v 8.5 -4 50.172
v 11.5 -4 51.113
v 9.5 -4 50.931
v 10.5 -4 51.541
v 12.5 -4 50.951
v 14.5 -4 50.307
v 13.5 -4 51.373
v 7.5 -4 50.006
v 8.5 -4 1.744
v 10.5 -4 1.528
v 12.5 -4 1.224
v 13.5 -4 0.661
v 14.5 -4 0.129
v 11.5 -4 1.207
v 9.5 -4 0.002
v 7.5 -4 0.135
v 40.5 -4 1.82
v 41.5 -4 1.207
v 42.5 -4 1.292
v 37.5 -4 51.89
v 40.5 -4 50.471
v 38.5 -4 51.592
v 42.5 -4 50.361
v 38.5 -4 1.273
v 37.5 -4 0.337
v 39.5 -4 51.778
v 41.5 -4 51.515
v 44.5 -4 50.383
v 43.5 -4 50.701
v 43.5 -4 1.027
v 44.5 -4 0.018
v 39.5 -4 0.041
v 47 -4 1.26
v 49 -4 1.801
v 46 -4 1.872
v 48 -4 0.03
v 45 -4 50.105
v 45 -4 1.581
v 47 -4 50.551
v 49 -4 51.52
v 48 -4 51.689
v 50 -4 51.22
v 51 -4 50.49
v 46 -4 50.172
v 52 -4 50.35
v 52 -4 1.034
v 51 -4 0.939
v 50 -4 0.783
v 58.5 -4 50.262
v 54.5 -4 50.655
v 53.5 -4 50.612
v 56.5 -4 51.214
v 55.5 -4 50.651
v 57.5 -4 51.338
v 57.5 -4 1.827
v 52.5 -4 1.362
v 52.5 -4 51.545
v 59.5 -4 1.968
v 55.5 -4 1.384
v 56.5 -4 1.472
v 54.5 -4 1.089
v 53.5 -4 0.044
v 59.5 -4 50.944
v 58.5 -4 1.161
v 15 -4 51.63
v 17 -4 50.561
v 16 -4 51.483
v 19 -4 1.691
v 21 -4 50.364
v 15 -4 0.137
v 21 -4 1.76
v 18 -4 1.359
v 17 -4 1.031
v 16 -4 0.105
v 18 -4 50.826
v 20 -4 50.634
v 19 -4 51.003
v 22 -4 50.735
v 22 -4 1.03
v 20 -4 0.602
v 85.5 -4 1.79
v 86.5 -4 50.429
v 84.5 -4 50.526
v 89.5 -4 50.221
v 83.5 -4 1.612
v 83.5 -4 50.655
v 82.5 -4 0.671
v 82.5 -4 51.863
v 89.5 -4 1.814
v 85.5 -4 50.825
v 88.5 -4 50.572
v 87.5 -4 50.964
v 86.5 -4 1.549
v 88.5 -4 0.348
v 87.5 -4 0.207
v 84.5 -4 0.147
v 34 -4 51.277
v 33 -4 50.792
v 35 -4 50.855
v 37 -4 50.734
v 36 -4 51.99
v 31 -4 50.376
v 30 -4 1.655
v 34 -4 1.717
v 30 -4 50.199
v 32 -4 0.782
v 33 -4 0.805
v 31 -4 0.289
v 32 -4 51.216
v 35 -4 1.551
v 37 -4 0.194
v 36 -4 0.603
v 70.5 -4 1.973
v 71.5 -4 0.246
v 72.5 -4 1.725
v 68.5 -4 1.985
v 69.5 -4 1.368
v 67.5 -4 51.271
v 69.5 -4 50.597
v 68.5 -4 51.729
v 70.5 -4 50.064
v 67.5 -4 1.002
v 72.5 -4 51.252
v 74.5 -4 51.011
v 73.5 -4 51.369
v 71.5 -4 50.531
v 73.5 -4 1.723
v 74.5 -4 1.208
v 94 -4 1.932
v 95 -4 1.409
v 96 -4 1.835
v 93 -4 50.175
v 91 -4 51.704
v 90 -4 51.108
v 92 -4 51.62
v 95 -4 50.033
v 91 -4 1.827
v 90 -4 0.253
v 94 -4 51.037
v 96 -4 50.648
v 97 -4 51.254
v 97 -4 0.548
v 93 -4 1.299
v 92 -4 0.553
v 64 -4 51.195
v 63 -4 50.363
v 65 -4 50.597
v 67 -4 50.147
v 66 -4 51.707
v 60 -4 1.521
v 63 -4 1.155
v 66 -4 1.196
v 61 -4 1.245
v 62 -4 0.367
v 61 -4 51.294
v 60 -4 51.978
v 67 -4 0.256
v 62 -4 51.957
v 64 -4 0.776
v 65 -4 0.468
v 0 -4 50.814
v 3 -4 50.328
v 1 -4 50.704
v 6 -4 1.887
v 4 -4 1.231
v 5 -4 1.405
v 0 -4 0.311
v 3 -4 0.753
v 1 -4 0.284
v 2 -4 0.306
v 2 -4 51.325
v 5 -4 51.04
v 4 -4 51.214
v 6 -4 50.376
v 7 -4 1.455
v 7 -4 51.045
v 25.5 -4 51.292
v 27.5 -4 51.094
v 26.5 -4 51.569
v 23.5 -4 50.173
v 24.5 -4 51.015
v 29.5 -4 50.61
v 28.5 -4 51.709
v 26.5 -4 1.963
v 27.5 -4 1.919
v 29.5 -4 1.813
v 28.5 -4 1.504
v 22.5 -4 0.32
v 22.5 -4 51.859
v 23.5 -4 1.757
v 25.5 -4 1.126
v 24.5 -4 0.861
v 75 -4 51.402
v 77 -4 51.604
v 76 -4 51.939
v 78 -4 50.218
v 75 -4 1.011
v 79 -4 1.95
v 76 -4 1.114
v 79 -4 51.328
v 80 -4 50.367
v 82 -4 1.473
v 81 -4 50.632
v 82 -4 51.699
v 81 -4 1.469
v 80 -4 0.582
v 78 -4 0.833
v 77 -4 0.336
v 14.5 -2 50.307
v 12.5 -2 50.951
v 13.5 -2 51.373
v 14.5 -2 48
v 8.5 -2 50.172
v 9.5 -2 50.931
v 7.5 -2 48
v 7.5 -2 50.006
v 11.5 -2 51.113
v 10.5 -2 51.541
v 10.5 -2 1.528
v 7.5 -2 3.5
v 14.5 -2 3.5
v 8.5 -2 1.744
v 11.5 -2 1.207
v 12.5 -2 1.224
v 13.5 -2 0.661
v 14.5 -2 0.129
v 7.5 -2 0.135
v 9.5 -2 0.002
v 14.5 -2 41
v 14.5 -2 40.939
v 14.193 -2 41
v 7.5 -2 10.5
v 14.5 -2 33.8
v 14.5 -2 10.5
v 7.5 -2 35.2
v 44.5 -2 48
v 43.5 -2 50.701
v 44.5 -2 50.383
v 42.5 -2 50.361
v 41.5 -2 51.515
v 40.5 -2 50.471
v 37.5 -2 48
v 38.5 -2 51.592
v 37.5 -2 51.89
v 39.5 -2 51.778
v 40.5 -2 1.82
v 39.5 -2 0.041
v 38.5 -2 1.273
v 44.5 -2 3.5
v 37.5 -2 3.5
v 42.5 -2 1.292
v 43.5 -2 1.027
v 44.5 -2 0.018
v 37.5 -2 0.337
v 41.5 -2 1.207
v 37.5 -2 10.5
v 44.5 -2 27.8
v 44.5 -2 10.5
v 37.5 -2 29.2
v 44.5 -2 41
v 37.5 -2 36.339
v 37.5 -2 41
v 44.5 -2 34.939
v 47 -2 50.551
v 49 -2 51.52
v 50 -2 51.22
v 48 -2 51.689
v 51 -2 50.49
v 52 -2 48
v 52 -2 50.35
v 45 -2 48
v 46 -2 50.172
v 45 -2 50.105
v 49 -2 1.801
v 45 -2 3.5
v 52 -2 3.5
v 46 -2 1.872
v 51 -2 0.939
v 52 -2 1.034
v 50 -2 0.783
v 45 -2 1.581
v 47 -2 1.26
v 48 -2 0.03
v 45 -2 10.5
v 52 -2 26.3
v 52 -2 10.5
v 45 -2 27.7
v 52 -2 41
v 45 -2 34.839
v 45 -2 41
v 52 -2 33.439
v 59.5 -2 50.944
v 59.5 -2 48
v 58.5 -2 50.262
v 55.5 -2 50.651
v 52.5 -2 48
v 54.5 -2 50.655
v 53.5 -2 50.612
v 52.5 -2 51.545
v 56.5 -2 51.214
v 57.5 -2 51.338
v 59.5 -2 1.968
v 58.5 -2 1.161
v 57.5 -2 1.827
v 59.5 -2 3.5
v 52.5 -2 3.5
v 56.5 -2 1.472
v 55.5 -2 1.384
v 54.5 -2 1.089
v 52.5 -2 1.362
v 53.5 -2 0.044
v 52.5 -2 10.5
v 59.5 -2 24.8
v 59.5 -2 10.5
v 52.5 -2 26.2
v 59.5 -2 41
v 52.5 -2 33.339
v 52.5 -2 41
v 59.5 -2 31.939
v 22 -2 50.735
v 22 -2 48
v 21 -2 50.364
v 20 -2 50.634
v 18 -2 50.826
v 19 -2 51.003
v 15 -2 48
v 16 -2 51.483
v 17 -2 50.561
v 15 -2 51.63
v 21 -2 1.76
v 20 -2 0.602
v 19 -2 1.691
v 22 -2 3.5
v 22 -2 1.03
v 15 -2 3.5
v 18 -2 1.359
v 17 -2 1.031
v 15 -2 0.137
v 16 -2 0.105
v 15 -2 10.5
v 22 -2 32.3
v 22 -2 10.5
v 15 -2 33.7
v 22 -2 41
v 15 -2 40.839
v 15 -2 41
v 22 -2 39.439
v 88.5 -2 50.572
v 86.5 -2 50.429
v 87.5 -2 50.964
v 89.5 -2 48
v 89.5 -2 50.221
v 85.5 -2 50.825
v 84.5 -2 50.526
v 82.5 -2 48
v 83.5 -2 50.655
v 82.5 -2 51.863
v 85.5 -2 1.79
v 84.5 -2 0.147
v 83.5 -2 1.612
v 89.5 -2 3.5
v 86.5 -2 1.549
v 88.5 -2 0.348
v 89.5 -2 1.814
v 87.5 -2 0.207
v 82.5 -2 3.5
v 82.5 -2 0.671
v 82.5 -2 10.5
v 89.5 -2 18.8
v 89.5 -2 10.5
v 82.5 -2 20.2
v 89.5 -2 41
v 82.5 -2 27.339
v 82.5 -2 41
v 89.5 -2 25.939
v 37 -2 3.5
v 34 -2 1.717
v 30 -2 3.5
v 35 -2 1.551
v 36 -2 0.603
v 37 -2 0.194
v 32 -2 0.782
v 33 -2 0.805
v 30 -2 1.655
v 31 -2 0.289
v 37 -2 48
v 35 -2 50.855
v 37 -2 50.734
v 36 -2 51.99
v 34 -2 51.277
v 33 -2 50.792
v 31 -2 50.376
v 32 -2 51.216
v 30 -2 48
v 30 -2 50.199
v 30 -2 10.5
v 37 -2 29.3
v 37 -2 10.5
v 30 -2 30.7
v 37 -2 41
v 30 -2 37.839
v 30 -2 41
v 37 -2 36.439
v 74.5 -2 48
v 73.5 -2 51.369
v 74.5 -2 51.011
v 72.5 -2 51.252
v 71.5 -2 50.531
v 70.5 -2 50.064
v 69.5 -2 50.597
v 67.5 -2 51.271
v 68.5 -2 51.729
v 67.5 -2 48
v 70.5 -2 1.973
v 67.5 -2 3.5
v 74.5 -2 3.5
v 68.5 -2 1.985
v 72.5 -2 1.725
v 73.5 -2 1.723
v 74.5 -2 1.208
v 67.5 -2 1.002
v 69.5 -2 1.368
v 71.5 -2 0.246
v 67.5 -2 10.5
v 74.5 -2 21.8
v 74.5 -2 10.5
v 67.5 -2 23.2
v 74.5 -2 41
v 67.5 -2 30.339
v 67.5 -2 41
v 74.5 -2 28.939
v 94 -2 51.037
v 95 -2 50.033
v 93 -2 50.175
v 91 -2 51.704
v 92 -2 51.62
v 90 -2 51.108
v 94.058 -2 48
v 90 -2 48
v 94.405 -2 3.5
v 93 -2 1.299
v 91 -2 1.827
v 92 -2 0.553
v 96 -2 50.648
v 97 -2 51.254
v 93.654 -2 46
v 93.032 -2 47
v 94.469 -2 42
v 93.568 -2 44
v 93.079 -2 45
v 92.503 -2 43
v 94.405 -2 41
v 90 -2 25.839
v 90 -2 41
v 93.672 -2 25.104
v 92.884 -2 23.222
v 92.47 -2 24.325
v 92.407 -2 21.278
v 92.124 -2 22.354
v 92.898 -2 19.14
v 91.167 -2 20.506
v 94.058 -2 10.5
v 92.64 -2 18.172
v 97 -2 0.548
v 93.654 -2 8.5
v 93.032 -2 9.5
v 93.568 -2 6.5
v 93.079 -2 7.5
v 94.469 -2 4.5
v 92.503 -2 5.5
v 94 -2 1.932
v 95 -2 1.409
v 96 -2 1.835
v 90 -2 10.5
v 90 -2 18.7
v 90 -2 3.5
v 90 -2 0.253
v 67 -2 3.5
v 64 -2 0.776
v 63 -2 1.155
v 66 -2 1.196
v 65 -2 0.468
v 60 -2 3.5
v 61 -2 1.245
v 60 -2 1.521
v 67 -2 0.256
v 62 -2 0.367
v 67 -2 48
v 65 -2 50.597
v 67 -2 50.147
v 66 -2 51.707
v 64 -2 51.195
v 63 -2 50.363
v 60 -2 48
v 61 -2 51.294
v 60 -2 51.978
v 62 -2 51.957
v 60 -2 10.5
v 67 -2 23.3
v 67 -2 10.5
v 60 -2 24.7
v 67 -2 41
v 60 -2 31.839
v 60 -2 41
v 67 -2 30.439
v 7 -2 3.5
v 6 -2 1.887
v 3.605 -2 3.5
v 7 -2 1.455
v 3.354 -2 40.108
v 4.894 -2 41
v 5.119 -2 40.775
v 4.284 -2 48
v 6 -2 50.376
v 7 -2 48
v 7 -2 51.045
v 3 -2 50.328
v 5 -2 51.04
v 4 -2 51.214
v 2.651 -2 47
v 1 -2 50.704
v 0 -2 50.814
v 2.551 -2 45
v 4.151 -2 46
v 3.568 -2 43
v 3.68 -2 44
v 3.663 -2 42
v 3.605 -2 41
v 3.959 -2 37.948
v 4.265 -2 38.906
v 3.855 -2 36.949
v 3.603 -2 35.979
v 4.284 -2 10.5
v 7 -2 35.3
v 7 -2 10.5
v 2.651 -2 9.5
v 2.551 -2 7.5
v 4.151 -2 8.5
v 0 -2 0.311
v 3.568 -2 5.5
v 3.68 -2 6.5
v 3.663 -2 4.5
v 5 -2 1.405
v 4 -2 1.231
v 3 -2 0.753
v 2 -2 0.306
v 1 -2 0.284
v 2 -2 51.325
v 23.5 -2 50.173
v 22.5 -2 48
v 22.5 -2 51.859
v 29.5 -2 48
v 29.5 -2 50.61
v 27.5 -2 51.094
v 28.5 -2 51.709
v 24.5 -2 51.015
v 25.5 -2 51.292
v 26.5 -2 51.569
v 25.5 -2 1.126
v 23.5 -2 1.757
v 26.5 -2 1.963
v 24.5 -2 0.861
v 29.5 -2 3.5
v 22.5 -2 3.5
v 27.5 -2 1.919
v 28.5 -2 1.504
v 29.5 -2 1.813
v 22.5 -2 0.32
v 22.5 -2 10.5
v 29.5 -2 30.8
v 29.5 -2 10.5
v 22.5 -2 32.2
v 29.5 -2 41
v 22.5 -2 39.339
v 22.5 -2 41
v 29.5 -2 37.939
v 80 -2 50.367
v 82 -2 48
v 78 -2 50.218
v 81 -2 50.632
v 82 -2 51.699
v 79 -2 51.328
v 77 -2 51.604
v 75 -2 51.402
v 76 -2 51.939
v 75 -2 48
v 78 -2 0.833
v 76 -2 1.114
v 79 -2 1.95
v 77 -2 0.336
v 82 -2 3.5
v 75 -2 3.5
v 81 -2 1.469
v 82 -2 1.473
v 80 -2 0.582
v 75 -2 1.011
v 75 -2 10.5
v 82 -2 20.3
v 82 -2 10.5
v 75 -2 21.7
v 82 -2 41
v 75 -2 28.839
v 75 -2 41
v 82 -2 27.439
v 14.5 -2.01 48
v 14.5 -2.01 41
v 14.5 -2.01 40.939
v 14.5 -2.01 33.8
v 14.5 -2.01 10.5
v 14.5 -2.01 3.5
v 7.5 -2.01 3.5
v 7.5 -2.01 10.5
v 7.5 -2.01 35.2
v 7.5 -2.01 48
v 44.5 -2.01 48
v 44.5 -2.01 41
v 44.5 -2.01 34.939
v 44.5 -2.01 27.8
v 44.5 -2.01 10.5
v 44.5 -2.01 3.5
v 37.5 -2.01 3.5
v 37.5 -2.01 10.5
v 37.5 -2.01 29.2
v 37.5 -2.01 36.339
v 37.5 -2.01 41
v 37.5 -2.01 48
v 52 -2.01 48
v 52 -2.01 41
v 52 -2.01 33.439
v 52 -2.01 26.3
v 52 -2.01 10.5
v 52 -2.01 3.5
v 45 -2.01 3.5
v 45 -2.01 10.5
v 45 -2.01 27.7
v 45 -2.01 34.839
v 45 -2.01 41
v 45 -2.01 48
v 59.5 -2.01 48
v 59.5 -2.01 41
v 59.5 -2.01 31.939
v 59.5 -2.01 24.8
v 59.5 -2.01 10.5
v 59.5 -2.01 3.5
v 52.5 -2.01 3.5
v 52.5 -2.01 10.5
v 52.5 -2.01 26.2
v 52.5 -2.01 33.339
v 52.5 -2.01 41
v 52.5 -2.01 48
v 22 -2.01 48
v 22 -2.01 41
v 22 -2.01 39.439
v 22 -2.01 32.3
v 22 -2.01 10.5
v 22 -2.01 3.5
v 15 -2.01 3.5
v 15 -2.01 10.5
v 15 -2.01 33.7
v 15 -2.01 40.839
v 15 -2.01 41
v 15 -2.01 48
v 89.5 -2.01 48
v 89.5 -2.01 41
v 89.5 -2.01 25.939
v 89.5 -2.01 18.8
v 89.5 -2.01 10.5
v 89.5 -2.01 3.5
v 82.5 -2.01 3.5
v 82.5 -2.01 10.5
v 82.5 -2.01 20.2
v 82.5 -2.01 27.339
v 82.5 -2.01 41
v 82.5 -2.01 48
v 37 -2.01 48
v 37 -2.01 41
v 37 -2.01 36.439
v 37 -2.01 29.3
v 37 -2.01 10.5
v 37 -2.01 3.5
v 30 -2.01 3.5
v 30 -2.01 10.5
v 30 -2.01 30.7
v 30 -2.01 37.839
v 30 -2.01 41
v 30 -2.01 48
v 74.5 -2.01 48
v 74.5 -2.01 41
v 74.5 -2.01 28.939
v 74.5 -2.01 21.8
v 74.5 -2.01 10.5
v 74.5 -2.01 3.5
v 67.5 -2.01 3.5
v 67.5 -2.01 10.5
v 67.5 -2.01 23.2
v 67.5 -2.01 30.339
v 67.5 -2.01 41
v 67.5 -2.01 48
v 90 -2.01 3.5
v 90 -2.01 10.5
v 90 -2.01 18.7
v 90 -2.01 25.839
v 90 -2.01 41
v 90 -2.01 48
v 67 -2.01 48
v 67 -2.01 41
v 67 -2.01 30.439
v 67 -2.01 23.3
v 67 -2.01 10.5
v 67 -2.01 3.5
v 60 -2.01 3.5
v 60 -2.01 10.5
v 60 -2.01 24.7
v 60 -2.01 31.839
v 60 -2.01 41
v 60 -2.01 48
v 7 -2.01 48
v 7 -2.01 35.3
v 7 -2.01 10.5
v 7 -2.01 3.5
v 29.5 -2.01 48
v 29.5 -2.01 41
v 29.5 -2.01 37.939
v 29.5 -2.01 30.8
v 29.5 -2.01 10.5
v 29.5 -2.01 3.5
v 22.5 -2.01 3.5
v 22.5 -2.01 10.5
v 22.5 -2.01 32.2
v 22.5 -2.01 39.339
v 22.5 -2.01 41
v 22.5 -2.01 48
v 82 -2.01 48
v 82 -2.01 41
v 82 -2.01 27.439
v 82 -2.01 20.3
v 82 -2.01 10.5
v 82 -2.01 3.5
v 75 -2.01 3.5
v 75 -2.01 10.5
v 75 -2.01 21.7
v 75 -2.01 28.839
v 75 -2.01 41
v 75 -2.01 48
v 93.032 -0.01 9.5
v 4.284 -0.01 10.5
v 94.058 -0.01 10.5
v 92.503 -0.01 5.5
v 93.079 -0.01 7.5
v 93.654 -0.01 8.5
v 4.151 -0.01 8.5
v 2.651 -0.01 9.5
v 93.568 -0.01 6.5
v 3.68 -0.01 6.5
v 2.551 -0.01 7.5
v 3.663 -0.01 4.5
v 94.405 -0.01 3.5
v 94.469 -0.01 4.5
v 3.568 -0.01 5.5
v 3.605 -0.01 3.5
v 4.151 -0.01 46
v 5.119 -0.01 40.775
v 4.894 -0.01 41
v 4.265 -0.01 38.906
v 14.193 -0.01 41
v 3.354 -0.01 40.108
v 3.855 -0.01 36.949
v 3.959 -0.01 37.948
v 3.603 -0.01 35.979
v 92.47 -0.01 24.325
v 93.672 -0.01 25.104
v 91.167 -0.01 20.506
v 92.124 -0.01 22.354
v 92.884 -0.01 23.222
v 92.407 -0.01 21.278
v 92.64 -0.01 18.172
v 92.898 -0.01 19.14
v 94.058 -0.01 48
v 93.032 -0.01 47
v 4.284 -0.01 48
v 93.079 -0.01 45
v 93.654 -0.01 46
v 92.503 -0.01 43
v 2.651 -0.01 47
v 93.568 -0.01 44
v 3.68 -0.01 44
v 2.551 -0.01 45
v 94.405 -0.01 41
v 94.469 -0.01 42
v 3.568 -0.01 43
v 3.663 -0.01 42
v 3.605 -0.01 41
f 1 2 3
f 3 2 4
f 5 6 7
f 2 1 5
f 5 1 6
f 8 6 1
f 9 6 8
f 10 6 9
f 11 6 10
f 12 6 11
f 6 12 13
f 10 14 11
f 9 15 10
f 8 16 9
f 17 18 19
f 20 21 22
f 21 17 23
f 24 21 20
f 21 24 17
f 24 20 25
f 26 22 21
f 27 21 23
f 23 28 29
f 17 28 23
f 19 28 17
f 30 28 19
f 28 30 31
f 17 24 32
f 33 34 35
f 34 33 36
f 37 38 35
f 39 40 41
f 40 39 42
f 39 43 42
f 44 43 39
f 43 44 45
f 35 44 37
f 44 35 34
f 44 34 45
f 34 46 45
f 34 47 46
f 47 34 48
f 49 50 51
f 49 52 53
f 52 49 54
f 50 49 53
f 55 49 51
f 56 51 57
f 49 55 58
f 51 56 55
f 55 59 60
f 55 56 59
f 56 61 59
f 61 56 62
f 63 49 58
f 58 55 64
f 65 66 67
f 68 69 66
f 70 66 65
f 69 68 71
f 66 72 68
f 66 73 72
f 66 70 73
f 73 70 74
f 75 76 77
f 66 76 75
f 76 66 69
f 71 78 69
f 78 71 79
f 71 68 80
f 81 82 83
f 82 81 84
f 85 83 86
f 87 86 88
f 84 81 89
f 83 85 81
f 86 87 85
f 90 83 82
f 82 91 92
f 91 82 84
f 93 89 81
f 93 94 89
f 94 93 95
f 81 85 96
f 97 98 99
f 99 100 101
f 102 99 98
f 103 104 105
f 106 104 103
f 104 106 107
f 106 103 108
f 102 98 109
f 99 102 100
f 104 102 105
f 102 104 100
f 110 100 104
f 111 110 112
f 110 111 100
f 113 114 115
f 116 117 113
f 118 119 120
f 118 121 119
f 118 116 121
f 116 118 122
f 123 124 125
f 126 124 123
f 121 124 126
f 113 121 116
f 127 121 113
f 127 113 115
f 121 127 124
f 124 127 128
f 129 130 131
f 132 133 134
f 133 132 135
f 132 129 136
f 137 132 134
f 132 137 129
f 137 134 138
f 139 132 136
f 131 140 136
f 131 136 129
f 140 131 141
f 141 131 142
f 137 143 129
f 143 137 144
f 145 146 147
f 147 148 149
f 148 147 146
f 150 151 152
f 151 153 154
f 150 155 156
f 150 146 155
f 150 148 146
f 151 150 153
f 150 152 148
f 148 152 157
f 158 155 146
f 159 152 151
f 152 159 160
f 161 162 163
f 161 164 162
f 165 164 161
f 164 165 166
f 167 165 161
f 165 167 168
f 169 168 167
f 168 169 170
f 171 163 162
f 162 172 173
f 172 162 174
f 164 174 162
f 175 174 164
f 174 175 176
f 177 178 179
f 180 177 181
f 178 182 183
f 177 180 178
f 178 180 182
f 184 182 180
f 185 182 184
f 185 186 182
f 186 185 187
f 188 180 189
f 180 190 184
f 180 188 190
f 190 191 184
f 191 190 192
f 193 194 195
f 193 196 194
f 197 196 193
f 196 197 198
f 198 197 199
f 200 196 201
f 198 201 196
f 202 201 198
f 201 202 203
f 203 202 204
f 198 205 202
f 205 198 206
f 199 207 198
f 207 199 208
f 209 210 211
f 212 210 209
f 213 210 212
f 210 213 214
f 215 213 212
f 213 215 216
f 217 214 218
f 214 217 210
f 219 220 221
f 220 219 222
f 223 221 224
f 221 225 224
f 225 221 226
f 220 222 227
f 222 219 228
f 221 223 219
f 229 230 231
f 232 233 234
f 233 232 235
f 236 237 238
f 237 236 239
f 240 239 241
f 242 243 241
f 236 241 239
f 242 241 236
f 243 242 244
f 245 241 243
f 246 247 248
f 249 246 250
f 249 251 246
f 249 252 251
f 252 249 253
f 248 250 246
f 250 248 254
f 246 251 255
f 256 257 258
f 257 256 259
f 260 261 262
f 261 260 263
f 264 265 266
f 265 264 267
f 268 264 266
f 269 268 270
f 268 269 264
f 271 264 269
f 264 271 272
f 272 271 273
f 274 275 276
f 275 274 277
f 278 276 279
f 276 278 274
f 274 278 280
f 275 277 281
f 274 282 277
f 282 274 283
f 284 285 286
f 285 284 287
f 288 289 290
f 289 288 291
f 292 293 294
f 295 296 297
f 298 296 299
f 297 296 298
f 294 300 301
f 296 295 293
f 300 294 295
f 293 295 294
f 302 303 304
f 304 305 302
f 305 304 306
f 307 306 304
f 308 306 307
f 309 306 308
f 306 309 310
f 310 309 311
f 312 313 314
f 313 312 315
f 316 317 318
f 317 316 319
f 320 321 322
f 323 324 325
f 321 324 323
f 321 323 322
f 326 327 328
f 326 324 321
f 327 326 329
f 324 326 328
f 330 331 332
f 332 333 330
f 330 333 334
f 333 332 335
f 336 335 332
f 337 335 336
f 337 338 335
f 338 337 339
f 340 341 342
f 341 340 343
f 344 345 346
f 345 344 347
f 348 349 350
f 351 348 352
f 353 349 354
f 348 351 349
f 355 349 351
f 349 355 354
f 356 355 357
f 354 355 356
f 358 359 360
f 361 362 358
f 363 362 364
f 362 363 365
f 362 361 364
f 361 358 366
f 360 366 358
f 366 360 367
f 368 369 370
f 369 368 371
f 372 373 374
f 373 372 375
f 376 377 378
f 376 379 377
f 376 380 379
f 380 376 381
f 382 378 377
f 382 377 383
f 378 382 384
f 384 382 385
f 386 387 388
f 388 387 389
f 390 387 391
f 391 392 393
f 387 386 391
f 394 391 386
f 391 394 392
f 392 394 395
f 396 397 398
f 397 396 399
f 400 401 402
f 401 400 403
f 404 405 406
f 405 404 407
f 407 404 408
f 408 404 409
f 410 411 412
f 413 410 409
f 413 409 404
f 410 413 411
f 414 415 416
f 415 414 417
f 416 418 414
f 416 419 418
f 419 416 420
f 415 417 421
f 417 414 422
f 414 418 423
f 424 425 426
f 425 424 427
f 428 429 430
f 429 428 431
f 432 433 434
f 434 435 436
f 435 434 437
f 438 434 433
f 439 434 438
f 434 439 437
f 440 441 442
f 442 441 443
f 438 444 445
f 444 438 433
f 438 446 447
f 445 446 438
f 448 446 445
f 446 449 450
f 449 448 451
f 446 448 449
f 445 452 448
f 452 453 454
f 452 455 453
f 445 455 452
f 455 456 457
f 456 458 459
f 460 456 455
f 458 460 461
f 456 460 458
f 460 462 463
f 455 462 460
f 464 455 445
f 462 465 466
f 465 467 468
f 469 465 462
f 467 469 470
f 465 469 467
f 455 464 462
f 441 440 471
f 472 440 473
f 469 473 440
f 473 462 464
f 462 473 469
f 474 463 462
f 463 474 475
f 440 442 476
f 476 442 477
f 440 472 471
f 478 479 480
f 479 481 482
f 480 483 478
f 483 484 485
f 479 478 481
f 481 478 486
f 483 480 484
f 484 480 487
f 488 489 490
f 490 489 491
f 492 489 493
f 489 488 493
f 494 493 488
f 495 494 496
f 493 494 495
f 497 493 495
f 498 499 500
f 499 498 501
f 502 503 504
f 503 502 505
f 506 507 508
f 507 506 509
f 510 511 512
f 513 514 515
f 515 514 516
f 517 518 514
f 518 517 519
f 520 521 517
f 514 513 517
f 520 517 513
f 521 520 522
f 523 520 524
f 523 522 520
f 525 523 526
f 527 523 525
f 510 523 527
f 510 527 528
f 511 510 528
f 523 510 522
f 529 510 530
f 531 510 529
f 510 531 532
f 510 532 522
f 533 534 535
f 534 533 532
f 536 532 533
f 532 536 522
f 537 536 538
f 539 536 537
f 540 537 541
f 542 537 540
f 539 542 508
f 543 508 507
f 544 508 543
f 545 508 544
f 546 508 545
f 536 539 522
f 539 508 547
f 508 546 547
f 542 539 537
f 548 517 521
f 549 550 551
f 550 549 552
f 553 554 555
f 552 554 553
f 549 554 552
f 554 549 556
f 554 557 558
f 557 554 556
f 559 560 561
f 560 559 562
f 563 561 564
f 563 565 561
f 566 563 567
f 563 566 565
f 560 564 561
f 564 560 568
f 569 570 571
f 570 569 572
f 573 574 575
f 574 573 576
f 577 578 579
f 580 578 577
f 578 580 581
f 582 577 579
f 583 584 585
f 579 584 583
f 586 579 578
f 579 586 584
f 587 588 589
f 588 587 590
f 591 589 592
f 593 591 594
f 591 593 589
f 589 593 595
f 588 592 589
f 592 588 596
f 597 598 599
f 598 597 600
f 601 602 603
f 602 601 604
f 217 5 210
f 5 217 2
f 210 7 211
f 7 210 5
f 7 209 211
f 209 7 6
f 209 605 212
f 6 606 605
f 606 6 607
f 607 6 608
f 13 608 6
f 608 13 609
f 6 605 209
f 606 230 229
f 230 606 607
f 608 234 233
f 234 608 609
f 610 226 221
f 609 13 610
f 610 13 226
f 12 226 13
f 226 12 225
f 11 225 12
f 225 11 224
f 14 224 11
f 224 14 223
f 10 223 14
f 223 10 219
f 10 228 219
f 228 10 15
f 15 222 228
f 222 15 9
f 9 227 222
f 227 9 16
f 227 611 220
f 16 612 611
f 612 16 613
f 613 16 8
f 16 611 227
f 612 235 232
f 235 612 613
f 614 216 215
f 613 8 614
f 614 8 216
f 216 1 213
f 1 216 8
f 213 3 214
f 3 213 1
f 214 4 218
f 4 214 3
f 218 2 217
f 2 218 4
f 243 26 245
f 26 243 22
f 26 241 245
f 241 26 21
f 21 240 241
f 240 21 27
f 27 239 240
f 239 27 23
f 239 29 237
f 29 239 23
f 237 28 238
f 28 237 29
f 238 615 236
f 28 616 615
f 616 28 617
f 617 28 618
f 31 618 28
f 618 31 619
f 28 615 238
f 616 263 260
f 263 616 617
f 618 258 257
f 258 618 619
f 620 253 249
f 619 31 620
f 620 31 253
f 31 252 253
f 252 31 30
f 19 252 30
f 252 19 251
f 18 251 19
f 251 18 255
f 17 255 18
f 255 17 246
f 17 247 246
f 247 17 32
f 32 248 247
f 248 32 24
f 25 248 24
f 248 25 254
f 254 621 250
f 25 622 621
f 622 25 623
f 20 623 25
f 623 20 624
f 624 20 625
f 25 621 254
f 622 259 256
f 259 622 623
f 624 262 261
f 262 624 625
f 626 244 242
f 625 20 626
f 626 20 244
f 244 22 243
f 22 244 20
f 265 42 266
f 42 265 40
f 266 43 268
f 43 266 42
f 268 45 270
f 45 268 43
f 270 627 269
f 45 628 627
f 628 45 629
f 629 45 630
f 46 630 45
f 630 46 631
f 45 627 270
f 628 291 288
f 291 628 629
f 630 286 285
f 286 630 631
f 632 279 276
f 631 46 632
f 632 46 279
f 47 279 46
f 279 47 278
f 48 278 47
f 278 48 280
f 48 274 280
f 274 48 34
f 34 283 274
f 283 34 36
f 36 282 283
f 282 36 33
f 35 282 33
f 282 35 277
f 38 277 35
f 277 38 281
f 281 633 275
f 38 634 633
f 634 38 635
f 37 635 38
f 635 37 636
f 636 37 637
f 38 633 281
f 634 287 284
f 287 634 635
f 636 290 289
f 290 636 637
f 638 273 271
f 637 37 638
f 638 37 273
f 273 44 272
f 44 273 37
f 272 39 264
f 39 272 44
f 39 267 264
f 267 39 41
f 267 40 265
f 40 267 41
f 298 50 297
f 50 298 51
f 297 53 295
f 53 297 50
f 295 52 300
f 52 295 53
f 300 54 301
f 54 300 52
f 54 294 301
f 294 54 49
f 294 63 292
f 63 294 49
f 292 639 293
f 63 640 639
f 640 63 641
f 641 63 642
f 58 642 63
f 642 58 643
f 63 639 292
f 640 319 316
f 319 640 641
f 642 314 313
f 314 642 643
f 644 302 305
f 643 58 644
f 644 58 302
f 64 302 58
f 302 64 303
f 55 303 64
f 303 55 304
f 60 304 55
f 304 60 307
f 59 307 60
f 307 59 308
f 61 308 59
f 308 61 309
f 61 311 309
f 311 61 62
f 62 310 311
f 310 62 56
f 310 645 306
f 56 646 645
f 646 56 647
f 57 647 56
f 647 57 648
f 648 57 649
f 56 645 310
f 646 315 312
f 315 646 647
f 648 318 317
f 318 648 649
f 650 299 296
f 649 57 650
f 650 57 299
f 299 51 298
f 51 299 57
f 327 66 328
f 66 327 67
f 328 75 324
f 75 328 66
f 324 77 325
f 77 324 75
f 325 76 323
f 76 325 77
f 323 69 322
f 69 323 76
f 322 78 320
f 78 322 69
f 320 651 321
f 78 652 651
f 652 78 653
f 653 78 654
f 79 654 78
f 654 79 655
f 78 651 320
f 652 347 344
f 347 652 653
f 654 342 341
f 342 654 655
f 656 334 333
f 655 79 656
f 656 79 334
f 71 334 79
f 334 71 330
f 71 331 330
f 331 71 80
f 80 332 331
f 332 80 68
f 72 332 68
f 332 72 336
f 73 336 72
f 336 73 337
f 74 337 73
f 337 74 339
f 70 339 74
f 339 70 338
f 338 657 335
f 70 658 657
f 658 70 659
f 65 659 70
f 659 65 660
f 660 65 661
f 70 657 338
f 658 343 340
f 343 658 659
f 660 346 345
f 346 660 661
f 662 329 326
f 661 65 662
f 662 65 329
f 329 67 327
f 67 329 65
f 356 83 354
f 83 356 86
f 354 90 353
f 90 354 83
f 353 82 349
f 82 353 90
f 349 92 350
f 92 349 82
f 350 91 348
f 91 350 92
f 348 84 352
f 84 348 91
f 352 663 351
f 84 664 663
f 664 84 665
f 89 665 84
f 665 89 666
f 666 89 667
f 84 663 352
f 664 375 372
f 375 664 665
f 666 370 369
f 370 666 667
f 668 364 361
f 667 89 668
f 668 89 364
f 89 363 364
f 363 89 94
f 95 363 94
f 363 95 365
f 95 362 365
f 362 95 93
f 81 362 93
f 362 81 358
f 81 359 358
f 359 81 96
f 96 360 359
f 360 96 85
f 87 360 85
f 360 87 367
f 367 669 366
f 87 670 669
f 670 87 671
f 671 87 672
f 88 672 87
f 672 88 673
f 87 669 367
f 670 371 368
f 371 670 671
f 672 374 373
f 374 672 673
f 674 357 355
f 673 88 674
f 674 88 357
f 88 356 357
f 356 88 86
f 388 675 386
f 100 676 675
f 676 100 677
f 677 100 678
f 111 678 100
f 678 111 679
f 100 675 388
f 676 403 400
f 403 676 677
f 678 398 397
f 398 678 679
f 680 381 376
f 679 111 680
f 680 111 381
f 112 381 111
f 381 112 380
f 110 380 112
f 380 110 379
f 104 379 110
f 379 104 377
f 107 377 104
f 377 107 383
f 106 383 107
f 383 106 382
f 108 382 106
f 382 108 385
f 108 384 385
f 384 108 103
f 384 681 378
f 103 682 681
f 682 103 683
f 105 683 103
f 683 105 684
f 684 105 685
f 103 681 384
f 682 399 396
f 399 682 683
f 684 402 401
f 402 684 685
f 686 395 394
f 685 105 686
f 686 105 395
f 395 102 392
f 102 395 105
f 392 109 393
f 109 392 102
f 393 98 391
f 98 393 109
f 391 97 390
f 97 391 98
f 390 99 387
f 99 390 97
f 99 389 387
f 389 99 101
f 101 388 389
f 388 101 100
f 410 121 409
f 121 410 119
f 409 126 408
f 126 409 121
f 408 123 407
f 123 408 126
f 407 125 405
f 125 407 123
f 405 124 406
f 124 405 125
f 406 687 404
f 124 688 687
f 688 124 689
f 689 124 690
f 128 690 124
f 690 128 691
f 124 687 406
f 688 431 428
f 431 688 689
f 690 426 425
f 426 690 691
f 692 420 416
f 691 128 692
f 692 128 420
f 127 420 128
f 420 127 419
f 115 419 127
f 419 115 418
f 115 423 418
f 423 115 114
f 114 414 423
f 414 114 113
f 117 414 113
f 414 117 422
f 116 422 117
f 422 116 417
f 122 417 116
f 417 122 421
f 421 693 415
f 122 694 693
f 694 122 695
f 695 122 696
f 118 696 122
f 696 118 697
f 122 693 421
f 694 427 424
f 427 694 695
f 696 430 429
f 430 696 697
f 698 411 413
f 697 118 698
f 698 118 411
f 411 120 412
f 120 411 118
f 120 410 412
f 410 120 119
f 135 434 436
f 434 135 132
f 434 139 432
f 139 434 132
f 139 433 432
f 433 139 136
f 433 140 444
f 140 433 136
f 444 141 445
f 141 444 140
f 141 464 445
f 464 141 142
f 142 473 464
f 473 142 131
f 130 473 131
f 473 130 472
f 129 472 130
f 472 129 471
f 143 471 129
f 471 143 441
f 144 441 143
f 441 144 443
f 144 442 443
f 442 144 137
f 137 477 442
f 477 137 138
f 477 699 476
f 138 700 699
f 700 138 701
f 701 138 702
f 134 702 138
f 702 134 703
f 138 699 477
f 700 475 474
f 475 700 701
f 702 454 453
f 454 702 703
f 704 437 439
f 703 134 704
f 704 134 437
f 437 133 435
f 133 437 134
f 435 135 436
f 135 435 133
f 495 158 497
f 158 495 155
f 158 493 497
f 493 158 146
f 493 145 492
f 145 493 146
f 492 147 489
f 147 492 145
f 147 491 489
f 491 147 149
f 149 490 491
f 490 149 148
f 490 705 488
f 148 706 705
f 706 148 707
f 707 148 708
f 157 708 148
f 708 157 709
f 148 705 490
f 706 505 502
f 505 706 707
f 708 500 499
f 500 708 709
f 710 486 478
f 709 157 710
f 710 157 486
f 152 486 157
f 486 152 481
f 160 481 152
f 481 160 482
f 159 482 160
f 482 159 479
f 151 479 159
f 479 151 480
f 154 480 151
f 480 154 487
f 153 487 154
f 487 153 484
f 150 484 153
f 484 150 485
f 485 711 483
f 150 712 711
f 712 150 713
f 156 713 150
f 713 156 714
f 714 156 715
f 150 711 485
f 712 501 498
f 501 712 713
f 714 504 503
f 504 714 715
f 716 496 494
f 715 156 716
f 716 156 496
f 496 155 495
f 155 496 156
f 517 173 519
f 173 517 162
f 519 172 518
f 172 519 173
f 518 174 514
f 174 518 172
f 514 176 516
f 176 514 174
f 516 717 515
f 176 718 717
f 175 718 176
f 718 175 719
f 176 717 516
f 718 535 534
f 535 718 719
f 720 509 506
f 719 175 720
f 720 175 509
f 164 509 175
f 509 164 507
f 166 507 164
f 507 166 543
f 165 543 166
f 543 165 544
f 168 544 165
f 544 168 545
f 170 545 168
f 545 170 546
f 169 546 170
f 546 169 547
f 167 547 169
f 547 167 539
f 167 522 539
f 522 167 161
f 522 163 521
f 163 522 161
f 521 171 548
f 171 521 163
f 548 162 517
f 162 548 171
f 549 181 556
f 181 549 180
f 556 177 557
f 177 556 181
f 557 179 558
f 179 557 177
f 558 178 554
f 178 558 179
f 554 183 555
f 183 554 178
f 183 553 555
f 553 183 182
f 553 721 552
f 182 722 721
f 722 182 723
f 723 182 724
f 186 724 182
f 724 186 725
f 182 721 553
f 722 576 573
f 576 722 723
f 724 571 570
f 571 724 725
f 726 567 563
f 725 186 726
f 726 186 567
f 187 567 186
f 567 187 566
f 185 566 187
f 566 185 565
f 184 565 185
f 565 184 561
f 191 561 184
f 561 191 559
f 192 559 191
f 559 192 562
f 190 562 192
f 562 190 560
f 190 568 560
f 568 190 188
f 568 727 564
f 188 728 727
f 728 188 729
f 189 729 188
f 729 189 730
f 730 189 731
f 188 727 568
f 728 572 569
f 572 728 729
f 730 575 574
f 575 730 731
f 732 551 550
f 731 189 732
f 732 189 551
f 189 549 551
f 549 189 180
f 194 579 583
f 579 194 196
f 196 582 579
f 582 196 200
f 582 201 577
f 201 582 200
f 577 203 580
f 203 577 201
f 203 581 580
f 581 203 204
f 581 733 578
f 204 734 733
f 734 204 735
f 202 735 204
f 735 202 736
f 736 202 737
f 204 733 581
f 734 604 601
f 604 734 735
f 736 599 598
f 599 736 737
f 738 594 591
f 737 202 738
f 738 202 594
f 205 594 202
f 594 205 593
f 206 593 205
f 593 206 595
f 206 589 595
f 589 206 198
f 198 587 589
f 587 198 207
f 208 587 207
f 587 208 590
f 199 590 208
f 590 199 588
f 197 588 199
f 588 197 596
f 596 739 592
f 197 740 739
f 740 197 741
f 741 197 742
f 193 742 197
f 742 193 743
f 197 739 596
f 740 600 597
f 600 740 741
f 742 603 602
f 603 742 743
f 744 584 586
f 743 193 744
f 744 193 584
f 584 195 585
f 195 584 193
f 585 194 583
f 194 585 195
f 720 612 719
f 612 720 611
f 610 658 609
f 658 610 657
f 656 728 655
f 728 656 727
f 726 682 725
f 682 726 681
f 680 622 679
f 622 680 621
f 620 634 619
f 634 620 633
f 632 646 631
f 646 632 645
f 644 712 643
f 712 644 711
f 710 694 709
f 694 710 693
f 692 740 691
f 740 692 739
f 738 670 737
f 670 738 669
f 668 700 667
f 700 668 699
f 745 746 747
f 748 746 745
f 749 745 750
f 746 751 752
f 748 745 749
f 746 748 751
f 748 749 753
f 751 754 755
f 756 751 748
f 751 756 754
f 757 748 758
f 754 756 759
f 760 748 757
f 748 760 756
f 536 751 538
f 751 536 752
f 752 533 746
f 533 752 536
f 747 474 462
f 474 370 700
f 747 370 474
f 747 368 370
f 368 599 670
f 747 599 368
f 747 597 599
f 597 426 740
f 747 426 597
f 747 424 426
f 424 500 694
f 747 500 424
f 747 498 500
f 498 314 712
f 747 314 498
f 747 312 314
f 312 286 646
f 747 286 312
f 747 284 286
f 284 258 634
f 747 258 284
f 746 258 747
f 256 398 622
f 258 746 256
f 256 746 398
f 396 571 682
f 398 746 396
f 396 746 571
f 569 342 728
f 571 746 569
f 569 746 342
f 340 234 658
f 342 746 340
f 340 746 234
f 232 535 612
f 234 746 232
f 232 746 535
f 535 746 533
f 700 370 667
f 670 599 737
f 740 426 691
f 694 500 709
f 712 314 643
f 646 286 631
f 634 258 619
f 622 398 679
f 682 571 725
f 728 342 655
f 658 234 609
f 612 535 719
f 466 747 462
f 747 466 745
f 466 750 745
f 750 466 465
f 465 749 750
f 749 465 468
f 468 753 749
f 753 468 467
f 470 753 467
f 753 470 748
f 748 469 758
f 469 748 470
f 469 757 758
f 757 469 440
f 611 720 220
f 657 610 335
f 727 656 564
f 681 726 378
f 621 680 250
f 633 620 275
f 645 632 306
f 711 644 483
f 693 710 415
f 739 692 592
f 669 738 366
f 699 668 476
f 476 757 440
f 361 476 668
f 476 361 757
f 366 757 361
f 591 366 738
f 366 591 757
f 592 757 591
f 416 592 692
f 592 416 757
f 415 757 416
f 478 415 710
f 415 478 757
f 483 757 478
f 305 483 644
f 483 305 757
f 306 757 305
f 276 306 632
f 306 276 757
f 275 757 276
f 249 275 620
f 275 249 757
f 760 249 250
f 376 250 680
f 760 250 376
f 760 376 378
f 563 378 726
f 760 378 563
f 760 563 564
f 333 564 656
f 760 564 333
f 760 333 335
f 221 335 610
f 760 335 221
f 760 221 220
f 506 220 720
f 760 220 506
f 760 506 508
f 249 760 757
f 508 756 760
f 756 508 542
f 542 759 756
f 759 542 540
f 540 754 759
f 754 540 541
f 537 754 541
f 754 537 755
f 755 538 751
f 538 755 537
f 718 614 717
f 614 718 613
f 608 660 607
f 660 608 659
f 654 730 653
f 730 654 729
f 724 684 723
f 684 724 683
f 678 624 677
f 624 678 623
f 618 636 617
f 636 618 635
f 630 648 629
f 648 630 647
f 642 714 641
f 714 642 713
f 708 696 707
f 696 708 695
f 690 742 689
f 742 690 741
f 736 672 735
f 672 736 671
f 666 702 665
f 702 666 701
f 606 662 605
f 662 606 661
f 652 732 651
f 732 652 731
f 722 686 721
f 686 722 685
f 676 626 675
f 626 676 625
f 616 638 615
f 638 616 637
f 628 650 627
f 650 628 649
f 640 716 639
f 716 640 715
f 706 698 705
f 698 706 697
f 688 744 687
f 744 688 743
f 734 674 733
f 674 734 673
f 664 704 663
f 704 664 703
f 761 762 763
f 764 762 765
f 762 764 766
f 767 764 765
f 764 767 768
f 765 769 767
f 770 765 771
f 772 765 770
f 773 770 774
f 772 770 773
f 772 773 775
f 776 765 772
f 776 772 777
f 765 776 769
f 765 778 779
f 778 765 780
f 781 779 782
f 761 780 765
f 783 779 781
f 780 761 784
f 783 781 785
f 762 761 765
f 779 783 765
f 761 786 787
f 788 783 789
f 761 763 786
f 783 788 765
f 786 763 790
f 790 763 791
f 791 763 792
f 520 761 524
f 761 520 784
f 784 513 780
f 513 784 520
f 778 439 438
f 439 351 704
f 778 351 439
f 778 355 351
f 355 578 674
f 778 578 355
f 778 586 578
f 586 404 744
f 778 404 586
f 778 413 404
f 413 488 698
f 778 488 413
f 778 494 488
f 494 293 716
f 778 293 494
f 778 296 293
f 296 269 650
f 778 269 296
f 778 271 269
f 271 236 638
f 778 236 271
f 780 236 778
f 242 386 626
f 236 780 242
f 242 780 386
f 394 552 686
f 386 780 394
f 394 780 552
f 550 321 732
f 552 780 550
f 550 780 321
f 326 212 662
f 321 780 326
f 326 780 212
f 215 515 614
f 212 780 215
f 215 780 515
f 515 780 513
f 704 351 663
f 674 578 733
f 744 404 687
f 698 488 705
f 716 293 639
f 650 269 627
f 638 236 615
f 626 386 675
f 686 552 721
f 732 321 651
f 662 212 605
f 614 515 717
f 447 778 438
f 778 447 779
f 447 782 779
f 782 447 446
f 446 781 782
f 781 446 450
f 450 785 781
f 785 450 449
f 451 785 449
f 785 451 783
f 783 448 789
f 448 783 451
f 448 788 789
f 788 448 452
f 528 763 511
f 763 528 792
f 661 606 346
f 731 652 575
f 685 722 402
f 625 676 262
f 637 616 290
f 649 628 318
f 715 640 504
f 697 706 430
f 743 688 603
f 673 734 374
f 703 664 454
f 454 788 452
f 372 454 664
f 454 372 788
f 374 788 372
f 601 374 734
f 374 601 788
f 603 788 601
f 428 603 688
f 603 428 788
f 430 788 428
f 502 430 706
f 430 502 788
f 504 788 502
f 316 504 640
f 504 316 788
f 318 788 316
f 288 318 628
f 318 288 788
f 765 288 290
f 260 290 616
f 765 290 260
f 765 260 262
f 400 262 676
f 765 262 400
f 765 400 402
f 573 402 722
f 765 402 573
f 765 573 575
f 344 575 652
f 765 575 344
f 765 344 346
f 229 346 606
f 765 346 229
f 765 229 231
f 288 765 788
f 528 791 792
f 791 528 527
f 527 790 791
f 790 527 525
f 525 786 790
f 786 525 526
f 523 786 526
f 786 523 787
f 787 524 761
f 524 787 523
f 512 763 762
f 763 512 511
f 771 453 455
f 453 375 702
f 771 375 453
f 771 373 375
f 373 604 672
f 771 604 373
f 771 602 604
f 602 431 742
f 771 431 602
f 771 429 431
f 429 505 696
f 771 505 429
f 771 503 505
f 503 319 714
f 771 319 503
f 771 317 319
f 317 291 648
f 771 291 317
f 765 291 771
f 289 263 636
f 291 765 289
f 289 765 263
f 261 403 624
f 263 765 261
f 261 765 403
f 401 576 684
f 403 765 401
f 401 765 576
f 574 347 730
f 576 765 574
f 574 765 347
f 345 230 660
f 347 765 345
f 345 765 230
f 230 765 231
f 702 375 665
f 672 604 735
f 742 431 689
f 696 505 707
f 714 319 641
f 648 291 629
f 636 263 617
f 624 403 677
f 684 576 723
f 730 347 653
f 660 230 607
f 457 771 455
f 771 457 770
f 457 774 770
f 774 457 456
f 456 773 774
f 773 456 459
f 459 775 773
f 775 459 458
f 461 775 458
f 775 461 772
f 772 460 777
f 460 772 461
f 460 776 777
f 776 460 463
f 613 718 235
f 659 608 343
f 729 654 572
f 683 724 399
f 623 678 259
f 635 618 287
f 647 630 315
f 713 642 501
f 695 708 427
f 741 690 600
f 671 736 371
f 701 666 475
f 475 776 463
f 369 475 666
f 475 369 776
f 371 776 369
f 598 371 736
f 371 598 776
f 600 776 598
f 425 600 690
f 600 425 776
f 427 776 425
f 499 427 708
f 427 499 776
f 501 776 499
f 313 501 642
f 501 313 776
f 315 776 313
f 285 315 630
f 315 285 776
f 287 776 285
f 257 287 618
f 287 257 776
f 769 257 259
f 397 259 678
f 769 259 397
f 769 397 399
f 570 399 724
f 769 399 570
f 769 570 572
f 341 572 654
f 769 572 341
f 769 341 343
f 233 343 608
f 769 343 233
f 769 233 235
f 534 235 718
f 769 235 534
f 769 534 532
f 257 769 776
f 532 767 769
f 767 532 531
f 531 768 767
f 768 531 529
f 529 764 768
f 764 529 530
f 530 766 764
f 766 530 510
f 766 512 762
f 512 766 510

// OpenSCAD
/* woodwall.scad
 *
 * Copyright (C) Robert B. Ross, 2016
 *
 * This software is released under the Creative Commons
 * Attribution-ShareAlike 4.0 International Public License.
 */

myWidth=7;

woodWall(height=50,crossPiece=1);

/* woodWall()
 *
 * NOTE: Back of wall is at y=0, bottom is at z=0, left at x=0.
 */
module woodWall(height=60,length=90,crossPiece=0) {
   /* work out plank widths from length */
   count = length / (myWidth + 0.5);

   // +1 on Z translation is to account for random perturbations of planks.
   translate([0,-4,height+1]) rotate([-90,0,0]) union() {
      linear_extrude(height=2.0) for (i=[0:count]) {
         translate([i*(myWidth+0.5),0,0]) plank(width=myWidth,length=height,seed=i);
      }

      translate([myWidth/2,.95*height,1.99]) rotate([0,0,-90])
         linear_extrude(height=2.0) plank(length=count*(myWidth+0.5),width=myWidth,seed=101);
      translate([myWidth/2,10,1.99]) rotate([0,0,-90])
         linear_extrude(height=2.0) plank(length=count*(myWidth+0.5),width=myWidth,seed=101);

      if (crossPiece) {
         cAngle = atan((height - 5*myWidth)/((count-2)*(myWidth+0.5)));

         //translate([2,17,1.99]) rotate([0,0,-65])

         translate([myWidth/2,.3*height,1.99]) rotate([0,0,cAngle-90])
            linear_extrude(height=2.0)
               plank(length=count*(myWidth+0.5),width=myWidth,seed=101);
      }
   }
}

/* plank() -- generates a 2D plank outline of specified width and length
 *
 * NOTES:
 * - Intention is that you linear_extrude this to the desired height.
 * - The seed parameter can be used to generate different rough ends.
 */
module plank(width=7,length=70,seed=1) {
   widthPoints=7; // cannot modify without editing code

   rough = rands(min_value=-1,max_value=1,value_count=2*(widthPoints+1),
                 seed_value=seed);

   polygon(points=[[0,0+rough[0]], [0,length+rough[1]],
                   [width/widthPoints,length+rough[2]],
                   [2*width/widthPoints,length+rough[3]],
                   [3*width/widthPoints,length+rough[4]],
                   [4*width/widthPoints,length+rough[5]],
                   [5*width/widthPoints,length+rough[6]],
                   [6*width/widthPoints,length+rough[7]],
                   [7*width/widthPoints,length+rough[8]],
                   [7*width/widthPoints,rough[9]],
                   [6*width/widthPoints,rough[10]],
                   [5*width/widthPoints,rough[11]],
                   [4*width/widthPoints,rough[12]],
                   [3*width/widthPoints,rough[13]],
                   [2*width/widthPoints,rough[14]],
                   [width/widthPoints,rough[15]]]);
}
